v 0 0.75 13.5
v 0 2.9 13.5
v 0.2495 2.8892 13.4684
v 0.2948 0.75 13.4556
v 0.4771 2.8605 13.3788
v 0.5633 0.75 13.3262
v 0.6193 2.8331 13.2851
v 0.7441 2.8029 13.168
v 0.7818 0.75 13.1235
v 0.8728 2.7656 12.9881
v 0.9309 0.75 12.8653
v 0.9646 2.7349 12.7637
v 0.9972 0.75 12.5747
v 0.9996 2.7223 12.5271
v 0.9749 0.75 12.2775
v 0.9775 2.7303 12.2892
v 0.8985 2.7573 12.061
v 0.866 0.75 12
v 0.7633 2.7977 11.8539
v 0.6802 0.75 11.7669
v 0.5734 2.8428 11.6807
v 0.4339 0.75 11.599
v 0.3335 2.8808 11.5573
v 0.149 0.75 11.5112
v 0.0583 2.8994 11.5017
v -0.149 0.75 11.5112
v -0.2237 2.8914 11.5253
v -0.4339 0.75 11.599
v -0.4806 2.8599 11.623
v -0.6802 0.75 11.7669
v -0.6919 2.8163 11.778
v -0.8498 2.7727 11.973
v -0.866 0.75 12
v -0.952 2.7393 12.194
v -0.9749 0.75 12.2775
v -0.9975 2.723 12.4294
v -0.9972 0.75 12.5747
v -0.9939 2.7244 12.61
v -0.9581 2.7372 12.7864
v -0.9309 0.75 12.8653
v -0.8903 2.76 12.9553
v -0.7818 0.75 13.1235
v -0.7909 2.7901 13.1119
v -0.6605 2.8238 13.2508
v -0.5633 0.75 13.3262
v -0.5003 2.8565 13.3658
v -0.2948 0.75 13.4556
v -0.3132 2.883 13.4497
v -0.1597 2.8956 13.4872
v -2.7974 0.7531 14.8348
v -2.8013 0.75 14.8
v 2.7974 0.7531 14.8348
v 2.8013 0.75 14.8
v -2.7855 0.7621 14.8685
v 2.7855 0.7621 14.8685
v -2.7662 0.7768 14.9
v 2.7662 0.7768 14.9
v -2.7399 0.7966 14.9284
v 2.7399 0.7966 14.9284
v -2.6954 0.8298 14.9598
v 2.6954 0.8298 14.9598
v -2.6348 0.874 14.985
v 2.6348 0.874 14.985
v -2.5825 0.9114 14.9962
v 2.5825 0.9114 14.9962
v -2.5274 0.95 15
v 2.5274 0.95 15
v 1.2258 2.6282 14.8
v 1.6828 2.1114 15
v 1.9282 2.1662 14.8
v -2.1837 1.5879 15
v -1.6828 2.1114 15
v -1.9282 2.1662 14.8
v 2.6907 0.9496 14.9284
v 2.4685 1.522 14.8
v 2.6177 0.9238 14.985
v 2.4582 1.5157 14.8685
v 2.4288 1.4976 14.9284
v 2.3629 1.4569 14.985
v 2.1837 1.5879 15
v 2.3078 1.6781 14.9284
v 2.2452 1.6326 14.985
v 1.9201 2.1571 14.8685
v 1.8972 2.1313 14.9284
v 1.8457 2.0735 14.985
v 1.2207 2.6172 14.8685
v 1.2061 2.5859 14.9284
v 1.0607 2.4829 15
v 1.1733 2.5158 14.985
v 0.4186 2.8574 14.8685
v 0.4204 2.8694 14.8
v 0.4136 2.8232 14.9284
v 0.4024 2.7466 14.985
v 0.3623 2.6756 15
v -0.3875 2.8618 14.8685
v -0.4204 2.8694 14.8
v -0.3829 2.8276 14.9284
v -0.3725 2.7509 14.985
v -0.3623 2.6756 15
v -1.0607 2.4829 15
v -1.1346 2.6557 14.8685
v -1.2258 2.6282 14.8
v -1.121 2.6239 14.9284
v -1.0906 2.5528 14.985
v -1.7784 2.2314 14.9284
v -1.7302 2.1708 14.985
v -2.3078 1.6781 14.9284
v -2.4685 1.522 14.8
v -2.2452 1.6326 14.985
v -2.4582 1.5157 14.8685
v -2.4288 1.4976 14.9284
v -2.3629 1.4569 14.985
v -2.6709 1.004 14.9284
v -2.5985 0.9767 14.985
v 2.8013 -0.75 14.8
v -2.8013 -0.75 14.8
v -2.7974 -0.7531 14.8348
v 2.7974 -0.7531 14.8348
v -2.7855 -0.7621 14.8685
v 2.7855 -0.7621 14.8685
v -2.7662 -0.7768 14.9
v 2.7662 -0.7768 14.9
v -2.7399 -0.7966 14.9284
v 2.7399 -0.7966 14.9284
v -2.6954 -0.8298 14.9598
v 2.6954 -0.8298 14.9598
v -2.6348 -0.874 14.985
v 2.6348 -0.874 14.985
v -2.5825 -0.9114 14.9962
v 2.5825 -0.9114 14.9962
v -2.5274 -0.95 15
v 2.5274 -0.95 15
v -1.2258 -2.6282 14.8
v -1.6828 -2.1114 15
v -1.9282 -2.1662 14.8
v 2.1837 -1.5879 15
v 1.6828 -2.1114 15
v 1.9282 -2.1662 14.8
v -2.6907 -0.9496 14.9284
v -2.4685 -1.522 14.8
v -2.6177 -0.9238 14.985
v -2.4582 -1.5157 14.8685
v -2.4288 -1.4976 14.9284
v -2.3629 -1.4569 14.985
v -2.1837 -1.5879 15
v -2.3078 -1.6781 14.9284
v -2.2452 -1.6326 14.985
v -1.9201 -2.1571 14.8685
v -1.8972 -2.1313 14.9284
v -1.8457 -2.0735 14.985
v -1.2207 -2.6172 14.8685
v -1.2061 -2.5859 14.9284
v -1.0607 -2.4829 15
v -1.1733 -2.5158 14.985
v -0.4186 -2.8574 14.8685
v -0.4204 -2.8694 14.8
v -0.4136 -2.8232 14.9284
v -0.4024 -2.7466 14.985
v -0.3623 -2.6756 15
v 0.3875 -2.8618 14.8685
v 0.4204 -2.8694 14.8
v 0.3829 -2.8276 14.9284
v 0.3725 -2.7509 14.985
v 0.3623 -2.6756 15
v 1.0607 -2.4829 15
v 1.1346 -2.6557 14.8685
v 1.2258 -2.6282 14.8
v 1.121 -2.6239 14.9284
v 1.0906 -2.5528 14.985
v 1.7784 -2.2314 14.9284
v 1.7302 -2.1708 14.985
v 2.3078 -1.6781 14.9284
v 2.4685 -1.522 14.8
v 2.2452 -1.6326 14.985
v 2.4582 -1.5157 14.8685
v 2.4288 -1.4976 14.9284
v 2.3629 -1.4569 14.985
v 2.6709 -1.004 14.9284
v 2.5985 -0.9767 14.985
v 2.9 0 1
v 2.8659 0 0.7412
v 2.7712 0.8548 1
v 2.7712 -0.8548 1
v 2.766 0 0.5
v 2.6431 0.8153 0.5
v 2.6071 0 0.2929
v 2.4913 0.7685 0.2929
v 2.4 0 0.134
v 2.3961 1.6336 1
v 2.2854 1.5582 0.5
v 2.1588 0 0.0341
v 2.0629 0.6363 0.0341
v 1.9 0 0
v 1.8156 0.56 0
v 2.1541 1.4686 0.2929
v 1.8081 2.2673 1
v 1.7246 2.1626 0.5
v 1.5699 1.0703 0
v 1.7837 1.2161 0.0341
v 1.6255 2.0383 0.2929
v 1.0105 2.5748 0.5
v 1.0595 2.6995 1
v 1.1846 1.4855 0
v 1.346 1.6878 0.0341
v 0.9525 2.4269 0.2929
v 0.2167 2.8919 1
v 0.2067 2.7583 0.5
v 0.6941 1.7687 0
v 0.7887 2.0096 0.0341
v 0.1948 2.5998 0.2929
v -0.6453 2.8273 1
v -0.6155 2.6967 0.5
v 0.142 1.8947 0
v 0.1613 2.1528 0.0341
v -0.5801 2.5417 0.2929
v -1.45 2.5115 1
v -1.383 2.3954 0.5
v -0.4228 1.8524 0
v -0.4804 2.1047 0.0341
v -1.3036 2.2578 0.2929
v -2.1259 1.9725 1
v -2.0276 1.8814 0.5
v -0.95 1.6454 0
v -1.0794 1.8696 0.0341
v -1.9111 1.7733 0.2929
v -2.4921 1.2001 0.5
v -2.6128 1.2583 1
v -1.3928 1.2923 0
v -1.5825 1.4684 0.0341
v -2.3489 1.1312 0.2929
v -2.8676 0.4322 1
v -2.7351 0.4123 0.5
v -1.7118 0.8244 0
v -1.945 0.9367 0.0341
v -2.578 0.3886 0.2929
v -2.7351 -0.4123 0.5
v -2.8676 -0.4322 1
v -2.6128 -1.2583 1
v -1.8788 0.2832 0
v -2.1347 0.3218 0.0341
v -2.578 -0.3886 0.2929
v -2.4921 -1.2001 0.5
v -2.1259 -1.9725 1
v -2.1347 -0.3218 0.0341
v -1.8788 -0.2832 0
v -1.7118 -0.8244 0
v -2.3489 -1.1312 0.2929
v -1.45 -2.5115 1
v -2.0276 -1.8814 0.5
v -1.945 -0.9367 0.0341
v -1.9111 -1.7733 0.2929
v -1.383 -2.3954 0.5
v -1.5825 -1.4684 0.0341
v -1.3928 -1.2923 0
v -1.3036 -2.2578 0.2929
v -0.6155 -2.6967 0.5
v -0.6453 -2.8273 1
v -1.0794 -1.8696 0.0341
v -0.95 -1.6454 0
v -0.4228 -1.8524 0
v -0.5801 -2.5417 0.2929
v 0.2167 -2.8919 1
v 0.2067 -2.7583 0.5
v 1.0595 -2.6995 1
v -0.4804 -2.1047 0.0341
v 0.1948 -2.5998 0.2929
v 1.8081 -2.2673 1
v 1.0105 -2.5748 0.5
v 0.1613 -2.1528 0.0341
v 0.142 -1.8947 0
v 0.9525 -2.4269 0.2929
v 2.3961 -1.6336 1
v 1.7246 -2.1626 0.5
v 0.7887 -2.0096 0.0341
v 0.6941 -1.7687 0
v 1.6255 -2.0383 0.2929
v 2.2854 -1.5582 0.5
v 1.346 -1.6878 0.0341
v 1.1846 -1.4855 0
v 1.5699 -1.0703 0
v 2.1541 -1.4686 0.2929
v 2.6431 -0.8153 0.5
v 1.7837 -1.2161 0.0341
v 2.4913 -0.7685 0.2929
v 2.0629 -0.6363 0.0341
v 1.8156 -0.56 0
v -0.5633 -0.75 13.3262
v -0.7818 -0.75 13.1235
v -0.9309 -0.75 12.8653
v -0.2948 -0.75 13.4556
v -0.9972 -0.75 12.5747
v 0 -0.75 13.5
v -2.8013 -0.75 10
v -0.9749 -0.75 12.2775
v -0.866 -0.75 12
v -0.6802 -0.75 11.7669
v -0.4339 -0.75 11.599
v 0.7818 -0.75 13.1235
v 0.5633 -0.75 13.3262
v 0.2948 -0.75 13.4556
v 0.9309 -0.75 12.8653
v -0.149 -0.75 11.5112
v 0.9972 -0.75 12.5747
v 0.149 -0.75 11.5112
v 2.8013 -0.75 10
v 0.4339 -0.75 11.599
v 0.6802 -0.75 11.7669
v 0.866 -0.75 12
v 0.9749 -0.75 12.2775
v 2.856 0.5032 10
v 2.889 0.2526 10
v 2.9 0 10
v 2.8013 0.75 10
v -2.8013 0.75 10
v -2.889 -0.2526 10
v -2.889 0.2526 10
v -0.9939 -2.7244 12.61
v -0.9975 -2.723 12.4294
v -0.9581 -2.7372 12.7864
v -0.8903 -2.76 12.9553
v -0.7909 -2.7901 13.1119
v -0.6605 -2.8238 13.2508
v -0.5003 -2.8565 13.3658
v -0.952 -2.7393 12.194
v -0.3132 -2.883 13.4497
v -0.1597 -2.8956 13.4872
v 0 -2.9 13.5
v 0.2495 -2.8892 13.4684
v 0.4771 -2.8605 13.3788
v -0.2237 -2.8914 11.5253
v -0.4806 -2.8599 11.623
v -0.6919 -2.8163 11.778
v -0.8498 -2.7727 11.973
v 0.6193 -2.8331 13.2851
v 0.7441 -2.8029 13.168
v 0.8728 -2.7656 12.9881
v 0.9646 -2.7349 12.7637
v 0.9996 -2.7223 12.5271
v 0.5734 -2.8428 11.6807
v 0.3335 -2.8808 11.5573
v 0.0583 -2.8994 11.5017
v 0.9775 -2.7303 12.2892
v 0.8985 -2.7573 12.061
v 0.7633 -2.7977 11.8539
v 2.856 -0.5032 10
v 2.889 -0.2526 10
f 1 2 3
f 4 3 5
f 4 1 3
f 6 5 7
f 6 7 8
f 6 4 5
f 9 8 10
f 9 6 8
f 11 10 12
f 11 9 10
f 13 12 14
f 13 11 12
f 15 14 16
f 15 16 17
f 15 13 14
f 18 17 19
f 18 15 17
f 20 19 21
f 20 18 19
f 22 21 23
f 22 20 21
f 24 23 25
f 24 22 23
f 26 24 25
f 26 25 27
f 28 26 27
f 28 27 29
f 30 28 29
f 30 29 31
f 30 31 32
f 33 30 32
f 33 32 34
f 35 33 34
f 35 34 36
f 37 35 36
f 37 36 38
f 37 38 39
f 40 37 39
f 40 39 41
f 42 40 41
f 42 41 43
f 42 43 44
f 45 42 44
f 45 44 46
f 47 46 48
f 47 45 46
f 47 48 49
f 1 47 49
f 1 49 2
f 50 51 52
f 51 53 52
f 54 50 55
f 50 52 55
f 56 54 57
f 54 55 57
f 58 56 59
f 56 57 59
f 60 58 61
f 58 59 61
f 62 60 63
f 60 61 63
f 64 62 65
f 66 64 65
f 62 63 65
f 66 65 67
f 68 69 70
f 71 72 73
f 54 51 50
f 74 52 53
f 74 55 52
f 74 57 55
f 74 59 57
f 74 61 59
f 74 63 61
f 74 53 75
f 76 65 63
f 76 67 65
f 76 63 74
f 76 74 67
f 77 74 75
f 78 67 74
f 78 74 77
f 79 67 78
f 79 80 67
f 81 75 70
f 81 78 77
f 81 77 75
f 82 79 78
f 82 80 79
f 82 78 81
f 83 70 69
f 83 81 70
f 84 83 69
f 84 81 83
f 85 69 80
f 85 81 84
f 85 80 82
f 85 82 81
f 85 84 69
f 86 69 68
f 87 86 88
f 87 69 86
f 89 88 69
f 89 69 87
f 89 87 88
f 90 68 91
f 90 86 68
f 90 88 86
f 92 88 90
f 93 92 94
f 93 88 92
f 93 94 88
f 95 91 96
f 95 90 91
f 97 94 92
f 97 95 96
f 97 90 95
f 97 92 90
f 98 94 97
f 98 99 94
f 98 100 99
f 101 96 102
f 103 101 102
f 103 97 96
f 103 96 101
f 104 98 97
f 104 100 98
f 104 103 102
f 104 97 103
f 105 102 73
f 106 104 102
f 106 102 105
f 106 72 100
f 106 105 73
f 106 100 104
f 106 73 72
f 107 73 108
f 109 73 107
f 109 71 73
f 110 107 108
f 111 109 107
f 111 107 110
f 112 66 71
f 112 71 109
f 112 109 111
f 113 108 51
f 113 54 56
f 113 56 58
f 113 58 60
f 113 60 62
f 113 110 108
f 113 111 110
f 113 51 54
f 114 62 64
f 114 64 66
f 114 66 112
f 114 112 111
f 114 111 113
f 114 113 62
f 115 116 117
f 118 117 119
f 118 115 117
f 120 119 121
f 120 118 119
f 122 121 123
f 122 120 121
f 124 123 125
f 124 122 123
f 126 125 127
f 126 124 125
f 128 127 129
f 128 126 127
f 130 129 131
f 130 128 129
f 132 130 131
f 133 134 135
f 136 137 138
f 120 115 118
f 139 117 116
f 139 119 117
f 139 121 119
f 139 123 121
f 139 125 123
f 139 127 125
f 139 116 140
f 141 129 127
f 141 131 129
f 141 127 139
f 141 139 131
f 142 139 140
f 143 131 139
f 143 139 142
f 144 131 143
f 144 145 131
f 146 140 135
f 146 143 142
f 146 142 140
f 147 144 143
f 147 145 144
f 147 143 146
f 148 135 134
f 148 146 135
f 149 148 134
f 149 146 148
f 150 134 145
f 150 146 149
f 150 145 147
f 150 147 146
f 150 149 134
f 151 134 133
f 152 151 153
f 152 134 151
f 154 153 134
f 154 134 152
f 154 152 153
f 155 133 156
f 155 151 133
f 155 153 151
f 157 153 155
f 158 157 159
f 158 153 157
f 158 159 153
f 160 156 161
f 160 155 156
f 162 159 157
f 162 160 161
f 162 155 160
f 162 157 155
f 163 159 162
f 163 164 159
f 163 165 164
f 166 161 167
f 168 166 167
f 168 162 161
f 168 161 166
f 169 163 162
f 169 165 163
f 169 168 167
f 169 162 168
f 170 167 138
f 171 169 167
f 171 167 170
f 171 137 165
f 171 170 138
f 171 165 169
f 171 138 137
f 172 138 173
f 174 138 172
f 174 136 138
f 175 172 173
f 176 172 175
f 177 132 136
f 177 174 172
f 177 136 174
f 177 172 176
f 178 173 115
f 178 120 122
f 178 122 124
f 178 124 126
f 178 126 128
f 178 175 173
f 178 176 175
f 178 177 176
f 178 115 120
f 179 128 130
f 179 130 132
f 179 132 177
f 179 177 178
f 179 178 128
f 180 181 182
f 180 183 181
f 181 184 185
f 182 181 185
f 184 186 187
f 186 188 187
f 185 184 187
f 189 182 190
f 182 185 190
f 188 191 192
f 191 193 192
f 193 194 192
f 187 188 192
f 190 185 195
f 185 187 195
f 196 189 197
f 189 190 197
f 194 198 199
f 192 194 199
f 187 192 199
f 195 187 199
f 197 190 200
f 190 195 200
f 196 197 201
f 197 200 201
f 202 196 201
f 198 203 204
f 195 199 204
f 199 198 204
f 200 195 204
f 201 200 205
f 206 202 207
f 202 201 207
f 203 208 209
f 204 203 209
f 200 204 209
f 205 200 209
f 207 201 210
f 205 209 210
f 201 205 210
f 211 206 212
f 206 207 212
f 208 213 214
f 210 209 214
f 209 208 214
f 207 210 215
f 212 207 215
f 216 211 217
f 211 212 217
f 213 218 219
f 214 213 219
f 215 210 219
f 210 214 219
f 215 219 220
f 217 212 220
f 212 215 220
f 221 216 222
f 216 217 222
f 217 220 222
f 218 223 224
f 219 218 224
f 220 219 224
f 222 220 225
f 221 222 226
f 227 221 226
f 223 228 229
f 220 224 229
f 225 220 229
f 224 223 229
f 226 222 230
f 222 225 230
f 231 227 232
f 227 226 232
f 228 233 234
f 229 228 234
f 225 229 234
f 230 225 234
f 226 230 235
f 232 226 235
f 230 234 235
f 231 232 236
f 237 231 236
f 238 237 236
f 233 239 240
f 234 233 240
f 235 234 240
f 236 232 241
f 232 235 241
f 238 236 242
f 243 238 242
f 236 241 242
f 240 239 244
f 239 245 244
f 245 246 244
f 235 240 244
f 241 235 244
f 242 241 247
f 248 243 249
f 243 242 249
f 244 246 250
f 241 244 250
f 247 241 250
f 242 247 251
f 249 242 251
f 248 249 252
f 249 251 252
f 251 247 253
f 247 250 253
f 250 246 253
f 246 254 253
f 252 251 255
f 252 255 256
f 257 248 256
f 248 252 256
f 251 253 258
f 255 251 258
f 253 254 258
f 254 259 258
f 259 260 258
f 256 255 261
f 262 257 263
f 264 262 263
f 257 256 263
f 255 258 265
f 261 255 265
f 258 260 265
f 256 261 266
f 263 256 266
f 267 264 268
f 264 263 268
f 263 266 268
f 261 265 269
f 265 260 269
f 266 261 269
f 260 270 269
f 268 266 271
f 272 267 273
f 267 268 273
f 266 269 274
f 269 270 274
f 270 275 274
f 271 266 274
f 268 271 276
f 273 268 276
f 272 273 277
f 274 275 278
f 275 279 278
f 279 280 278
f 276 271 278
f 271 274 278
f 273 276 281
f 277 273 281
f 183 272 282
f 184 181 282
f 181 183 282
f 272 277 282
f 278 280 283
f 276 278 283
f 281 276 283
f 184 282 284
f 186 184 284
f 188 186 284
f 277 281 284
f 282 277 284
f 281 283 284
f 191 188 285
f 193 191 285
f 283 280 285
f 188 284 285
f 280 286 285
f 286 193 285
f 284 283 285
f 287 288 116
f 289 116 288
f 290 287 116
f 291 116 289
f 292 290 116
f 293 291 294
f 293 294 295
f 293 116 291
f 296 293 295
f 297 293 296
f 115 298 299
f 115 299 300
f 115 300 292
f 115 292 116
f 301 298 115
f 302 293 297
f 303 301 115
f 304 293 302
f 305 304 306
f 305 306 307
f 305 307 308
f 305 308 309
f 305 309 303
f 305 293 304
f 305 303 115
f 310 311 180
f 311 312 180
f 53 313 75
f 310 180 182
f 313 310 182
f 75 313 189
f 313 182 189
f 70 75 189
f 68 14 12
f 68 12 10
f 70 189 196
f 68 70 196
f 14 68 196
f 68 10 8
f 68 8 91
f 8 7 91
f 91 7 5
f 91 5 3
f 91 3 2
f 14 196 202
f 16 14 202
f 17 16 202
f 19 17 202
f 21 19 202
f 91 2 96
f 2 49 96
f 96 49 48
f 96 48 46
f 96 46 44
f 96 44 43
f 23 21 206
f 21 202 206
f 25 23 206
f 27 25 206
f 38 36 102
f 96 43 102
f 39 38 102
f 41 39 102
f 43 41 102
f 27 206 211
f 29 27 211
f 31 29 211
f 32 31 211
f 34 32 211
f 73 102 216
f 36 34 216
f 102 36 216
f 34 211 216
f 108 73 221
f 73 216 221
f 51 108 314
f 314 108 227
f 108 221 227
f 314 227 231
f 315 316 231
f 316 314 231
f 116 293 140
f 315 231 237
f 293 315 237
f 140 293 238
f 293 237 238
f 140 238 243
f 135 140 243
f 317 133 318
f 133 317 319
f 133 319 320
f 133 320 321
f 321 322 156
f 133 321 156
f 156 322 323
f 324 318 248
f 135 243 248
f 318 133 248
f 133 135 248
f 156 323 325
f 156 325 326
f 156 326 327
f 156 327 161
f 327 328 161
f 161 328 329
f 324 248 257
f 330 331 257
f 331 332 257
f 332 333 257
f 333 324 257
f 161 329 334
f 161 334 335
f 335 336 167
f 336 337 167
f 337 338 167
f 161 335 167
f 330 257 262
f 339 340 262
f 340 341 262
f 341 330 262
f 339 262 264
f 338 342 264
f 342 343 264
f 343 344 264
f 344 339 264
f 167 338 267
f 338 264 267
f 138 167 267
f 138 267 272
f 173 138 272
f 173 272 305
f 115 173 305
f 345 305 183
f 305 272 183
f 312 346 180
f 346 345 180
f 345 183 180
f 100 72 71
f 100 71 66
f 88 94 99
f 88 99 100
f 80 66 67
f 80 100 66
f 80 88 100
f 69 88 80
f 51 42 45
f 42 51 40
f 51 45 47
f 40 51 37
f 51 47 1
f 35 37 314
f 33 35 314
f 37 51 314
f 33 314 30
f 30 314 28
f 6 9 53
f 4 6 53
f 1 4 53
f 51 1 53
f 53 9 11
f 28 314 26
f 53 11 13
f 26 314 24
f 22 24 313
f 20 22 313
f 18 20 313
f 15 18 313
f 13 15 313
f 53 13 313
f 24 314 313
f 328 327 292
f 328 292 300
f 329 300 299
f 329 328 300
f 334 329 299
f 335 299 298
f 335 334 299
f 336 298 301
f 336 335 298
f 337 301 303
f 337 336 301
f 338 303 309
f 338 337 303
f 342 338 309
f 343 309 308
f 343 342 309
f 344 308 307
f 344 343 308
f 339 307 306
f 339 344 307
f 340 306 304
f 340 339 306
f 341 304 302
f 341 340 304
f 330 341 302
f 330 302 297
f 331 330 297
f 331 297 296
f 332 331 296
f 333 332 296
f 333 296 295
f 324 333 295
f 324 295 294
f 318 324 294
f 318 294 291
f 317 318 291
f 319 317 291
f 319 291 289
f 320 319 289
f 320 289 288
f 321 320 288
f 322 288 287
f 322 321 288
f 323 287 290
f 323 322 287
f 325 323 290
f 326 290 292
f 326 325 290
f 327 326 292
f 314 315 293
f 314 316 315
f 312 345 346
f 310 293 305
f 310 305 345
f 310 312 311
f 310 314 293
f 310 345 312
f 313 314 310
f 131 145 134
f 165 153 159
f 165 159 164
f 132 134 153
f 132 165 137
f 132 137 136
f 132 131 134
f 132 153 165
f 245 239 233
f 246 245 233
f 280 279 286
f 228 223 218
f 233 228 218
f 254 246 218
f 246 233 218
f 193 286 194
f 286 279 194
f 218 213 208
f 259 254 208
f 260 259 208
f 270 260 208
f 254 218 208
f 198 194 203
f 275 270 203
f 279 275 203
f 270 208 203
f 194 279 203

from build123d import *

# Parameters (mm, degrees)
SKETCH1_R               = 2.9
BOSS_EXTRUDE1_DEPTH     = 15
FILLET2_R               = 1
SKETCH2_W               = 5.8
SKETCH2_H               = 5
CUT_EXTRUDE1_DEPTH      = 0.75
CUT_EXTRUDE2_DEPTH      = 16.550562691
CUT_EXTRUDE2_DEPTH_BACK = 16.550562691
SKETCH2_3_R             = 1
FILLET4_R               = 0.2


with BuildPart() as part:
    # Sketch1 → Boss-Extrude1 (new body)
    with BuildSketch(Plane.XY):
        Circle(SKETCH1_R)
    extrude(amount=BOSS_EXTRUDE1_DEPTH)

    # Fillet2
    fillet2_edges = [part.edges().sort_by_distance(p)[0] for p in [
        (-2.9, 0, 0),
    ]]
    fillet(fillet2_edges, radius=FILLET2_R)

    # Sketch2 → Cut-Extrude1 (cut, symmetric)
    with BuildSketch(Plane(origin=(0, 0, 0), x_dir=(1, 0, 0), z_dir=(0, 1, 0))):
        with Locations((0, -12.5)):
            Rectangle(SKETCH2_W, SKETCH2_H)
    extrude(amount=CUT_EXTRUDE1_DEPTH, both=True, mode=Mode.SUBTRACT)

    # Sketch2<3> → Cut-Extrude2 (cut, two sides: drawn at the far end of the back side and taken through both)
    with BuildSketch(Plane(origin=(0, 0, 0), x_dir=(1, 0, 0), z_dir=(0, 1, 0)).offset(-CUT_EXTRUDE2_DEPTH_BACK)):
        with Locations((0, -12.5)):
            Circle(SKETCH2_3_R)
    extrude(amount=CUT_EXTRUDE2_DEPTH + CUT_EXTRUDE2_DEPTH_BACK, mode=Mode.SUBTRACT)

    # Fillet4
    fillet4_edges = [part.edges().sort_by_distance(p)[0] for p in [
        (0, -0.75, 15),
        (0, -2.9, 15),
        (0, 2.9, 15),
        (0, 0.75, 15),
    ]]
    fillet(fillet4_edges, radius=FILLET4_R)


solid = part.part
